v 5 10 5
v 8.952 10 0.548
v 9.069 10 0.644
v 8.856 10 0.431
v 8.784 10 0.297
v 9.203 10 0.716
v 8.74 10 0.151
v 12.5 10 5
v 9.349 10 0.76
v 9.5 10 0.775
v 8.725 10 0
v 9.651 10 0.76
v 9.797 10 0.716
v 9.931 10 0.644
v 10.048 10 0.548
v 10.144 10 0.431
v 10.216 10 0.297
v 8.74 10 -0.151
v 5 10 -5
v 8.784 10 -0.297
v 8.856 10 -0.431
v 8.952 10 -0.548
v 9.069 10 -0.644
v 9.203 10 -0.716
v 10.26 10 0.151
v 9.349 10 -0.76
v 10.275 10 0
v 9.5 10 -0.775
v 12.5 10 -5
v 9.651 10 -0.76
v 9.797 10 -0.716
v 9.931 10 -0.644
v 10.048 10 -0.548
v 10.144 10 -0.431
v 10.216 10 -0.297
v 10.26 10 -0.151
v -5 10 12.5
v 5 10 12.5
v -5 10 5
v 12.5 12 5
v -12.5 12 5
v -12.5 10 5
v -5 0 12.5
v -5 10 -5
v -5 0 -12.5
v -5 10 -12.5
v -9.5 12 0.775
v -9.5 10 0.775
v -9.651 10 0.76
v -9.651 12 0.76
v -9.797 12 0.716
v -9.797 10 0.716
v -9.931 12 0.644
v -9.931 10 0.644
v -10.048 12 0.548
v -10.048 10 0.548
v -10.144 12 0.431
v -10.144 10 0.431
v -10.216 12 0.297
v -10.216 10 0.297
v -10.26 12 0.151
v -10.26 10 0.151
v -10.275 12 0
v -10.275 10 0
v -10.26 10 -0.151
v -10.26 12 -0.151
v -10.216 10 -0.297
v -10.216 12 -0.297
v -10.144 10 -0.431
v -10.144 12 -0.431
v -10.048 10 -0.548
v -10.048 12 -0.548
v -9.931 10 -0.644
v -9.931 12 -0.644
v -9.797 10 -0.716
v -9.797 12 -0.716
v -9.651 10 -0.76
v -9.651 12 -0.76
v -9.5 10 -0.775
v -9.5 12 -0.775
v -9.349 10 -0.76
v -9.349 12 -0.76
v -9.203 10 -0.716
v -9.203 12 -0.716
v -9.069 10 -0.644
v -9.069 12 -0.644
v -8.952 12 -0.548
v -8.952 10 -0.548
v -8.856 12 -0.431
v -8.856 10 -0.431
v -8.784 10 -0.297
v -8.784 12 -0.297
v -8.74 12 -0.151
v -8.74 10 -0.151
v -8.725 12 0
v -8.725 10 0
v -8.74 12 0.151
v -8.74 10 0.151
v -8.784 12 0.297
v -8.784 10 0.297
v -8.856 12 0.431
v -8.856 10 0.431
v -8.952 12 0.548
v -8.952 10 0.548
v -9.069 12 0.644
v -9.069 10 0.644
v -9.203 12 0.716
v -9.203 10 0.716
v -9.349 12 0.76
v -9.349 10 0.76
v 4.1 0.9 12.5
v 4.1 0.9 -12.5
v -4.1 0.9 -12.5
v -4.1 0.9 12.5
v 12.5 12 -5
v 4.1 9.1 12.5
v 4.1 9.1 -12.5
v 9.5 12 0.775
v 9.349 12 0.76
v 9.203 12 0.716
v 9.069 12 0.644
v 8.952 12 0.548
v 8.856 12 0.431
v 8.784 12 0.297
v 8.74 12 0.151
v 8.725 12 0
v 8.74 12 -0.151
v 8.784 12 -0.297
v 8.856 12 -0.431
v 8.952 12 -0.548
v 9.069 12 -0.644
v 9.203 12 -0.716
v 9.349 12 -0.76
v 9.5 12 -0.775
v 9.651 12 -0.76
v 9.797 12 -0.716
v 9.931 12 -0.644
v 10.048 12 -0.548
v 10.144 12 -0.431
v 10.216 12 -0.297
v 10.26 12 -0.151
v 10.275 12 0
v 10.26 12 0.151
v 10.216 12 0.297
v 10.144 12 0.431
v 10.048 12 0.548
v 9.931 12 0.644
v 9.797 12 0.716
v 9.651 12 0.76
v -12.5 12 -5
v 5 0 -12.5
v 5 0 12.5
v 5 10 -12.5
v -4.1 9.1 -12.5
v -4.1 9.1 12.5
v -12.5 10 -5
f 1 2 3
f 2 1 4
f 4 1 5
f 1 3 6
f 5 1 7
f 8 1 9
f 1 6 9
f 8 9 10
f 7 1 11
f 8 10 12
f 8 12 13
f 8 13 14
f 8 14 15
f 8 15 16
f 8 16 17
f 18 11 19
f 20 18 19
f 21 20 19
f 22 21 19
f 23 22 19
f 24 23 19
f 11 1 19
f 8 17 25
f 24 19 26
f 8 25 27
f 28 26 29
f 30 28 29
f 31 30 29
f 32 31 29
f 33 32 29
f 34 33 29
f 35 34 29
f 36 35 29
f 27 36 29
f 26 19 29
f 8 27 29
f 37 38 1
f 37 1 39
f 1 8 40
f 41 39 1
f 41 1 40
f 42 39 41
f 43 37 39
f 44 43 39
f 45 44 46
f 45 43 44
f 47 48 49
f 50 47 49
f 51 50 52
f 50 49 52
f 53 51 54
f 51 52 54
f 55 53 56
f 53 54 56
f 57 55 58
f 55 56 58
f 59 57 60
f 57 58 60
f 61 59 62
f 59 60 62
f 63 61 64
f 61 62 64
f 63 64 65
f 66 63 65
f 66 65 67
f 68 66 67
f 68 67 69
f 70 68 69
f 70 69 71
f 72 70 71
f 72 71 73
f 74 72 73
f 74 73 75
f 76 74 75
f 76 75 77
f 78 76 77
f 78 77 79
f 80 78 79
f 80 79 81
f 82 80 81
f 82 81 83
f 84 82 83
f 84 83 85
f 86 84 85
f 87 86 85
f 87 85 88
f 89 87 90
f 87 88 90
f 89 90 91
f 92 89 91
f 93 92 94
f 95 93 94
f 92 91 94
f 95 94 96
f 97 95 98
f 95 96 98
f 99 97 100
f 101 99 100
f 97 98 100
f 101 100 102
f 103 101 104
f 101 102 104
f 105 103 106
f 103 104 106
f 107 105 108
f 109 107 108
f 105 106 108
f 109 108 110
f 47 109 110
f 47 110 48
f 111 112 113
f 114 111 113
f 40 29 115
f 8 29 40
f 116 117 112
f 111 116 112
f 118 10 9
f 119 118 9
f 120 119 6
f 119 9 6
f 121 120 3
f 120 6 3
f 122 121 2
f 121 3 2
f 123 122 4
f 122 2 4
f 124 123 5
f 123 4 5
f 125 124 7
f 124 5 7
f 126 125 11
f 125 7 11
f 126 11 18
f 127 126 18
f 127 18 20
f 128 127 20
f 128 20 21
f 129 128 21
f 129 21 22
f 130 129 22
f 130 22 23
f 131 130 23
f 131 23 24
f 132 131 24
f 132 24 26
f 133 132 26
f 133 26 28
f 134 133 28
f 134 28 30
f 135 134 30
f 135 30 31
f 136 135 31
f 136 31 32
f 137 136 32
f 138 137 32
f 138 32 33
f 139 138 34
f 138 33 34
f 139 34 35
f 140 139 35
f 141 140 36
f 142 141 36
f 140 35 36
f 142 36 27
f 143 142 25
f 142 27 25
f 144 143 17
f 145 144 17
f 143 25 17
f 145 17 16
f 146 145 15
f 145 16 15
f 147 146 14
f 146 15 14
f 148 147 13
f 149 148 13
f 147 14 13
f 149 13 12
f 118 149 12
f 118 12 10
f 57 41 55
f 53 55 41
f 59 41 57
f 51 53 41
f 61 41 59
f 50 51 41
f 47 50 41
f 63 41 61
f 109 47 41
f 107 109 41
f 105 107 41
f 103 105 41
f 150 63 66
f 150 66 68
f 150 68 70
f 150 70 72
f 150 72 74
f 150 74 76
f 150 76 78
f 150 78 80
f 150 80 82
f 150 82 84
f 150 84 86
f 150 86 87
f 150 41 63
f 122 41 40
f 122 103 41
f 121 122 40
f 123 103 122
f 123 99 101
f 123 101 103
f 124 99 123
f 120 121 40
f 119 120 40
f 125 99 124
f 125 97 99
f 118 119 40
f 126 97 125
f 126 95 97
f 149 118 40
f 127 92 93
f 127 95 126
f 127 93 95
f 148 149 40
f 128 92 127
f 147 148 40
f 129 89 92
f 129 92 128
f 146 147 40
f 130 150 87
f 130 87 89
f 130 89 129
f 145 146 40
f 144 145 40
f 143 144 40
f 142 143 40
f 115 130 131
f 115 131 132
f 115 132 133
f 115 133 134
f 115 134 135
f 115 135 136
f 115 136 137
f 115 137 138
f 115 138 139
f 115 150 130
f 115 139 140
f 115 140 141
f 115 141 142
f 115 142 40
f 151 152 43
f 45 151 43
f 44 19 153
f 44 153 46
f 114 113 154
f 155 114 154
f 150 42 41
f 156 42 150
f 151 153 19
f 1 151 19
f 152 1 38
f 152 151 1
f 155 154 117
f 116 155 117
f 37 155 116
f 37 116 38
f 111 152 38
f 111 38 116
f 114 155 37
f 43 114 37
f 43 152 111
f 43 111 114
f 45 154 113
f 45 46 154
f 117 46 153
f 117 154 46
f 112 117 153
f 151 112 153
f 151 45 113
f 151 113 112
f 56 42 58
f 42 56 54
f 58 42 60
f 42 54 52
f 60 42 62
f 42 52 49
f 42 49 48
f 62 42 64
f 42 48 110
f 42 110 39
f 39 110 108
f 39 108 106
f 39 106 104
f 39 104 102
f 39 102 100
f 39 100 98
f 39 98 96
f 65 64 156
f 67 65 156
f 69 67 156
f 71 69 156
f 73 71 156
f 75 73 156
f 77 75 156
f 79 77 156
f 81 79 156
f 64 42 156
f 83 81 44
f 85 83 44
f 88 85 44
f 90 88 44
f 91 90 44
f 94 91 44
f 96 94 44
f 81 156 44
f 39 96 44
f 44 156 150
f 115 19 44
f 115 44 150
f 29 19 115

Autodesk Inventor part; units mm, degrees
ref_plane "YZ Plane" through (0, 0, 0) normal (1, 0, 0) x (0, 1, 0)
ref_plane "XZ Plane" through (0, 0, 0) normal (0, 1, 0) x (-1, 0, 0)
ref_plane "XY Plane" through (0, 0, 0) normal (0, 0, 1) x (1, 0, 0)
sketch "Sketch1" plane through (0, 0, 0) normal (0, 1, 0) x (-1, 0, 0)
  line L0 (5, -12.5) -> (-5, -12.5)
  line L1 (-5, -12.5) -> (-5, 12.5)
  line L2 (-5, 12.5) -> (5, 12.5)
  line L3 (5, 12.5) -> (5, -12.5)
  line L4 (5, 0) -> (-5, 0)
  line L5 (0, -12.5) -> (0, 12.5)
  point P0 (0, 0)
  dimension "d1" = 10
  dimension "d2" = 25
extrude "Extrusion1" add sketch "Sketch1" along normal blind 10
sketch "Sketch2" plane through (-5, 0, 12.5) normal (0, 0, 1) x (1, 0, 0)
  line L0 (10, 0) -> (10, 10) projected
  line L1 (0, 0) -> (10, 0) projected
  line L2 (0, 0) -> (0, 10) projected
  line L3 (0, 10) -> (10, 10) projected
  line L4 (5, 10) -> (5, 0)
  line L5 (0.9, 9.1) -> (9.1, 9.1)
  line L6 (9.1, 9.1) -> (9.1, 0.9)
  line L7 (9.1, 0.9) -> (0.9, 0.9)
  line L8 (0.9, 0.9) -> (0.9, 9.1)
  line L9 (5, 9.1) -> (5, 0.9)
  line L10 (0, 5) -> (10, 5)
  line L11 (0.9, 5) -> (9.1, 5)
  line L12 (5, 9.1) -> (5, 0.9)
  point P0 (5, 5)
  point P1 (5, 5)
  dimension "d9" = 8.2
  dimension "d10" = 8.2
extrude "Extrusion2" cut sketch "Sketch2" against normal through all contours L10 L4 L5 L6 | L6 L7 L4 L10 | L7 L8 L10 L4 | L10 L8 L5 L4
sketch "Sketch5" plane through (0, 10, 0) normal (0, 1, 0) x (1, 0, 0)
  line L0 (-12.5, 5) -> (12.5, 5)
  line L1 (12.5, 5) -> (12.5, -5)
  line L2 (12.5, -5) -> (-12.5, -5)
  line L3 (-12.5, -5) -> (-12.5, 5)
  line L4 (-12.5, 0) -> (12.5, 0)
  line L5 (0, 5) -> (0, -5)
  point P0 (0, 0)
  dimension "d32" = 25
  dimension "d33" = 10
extrude "Extrusion4" add sketch "Sketch5" along normal blind 2
sketch "Sketch7" plane through (0, 12, 0) normal (0, 1, 0) x (1, 0, 0)
  line L0 (-12.5, 5) -> (-12.5, -5) projected
  line L1 (-12.5, 0) -> (12.5, 0)
  line L2 (12.5, -5) -> (12.5, 5) projected
  point P0 (0, 0)
  point P1 (-9.5, 0)
  point P2 (9.5, 0)
  dimension "d53" = 19
  dimension "d54" = 9.5
hole "Hole3" at (9.5, 12, 0) at (-9.5, 12, 0) direction (0, -1, 0) diameter 1.55 end through all
properties part number "Motor Mount"
